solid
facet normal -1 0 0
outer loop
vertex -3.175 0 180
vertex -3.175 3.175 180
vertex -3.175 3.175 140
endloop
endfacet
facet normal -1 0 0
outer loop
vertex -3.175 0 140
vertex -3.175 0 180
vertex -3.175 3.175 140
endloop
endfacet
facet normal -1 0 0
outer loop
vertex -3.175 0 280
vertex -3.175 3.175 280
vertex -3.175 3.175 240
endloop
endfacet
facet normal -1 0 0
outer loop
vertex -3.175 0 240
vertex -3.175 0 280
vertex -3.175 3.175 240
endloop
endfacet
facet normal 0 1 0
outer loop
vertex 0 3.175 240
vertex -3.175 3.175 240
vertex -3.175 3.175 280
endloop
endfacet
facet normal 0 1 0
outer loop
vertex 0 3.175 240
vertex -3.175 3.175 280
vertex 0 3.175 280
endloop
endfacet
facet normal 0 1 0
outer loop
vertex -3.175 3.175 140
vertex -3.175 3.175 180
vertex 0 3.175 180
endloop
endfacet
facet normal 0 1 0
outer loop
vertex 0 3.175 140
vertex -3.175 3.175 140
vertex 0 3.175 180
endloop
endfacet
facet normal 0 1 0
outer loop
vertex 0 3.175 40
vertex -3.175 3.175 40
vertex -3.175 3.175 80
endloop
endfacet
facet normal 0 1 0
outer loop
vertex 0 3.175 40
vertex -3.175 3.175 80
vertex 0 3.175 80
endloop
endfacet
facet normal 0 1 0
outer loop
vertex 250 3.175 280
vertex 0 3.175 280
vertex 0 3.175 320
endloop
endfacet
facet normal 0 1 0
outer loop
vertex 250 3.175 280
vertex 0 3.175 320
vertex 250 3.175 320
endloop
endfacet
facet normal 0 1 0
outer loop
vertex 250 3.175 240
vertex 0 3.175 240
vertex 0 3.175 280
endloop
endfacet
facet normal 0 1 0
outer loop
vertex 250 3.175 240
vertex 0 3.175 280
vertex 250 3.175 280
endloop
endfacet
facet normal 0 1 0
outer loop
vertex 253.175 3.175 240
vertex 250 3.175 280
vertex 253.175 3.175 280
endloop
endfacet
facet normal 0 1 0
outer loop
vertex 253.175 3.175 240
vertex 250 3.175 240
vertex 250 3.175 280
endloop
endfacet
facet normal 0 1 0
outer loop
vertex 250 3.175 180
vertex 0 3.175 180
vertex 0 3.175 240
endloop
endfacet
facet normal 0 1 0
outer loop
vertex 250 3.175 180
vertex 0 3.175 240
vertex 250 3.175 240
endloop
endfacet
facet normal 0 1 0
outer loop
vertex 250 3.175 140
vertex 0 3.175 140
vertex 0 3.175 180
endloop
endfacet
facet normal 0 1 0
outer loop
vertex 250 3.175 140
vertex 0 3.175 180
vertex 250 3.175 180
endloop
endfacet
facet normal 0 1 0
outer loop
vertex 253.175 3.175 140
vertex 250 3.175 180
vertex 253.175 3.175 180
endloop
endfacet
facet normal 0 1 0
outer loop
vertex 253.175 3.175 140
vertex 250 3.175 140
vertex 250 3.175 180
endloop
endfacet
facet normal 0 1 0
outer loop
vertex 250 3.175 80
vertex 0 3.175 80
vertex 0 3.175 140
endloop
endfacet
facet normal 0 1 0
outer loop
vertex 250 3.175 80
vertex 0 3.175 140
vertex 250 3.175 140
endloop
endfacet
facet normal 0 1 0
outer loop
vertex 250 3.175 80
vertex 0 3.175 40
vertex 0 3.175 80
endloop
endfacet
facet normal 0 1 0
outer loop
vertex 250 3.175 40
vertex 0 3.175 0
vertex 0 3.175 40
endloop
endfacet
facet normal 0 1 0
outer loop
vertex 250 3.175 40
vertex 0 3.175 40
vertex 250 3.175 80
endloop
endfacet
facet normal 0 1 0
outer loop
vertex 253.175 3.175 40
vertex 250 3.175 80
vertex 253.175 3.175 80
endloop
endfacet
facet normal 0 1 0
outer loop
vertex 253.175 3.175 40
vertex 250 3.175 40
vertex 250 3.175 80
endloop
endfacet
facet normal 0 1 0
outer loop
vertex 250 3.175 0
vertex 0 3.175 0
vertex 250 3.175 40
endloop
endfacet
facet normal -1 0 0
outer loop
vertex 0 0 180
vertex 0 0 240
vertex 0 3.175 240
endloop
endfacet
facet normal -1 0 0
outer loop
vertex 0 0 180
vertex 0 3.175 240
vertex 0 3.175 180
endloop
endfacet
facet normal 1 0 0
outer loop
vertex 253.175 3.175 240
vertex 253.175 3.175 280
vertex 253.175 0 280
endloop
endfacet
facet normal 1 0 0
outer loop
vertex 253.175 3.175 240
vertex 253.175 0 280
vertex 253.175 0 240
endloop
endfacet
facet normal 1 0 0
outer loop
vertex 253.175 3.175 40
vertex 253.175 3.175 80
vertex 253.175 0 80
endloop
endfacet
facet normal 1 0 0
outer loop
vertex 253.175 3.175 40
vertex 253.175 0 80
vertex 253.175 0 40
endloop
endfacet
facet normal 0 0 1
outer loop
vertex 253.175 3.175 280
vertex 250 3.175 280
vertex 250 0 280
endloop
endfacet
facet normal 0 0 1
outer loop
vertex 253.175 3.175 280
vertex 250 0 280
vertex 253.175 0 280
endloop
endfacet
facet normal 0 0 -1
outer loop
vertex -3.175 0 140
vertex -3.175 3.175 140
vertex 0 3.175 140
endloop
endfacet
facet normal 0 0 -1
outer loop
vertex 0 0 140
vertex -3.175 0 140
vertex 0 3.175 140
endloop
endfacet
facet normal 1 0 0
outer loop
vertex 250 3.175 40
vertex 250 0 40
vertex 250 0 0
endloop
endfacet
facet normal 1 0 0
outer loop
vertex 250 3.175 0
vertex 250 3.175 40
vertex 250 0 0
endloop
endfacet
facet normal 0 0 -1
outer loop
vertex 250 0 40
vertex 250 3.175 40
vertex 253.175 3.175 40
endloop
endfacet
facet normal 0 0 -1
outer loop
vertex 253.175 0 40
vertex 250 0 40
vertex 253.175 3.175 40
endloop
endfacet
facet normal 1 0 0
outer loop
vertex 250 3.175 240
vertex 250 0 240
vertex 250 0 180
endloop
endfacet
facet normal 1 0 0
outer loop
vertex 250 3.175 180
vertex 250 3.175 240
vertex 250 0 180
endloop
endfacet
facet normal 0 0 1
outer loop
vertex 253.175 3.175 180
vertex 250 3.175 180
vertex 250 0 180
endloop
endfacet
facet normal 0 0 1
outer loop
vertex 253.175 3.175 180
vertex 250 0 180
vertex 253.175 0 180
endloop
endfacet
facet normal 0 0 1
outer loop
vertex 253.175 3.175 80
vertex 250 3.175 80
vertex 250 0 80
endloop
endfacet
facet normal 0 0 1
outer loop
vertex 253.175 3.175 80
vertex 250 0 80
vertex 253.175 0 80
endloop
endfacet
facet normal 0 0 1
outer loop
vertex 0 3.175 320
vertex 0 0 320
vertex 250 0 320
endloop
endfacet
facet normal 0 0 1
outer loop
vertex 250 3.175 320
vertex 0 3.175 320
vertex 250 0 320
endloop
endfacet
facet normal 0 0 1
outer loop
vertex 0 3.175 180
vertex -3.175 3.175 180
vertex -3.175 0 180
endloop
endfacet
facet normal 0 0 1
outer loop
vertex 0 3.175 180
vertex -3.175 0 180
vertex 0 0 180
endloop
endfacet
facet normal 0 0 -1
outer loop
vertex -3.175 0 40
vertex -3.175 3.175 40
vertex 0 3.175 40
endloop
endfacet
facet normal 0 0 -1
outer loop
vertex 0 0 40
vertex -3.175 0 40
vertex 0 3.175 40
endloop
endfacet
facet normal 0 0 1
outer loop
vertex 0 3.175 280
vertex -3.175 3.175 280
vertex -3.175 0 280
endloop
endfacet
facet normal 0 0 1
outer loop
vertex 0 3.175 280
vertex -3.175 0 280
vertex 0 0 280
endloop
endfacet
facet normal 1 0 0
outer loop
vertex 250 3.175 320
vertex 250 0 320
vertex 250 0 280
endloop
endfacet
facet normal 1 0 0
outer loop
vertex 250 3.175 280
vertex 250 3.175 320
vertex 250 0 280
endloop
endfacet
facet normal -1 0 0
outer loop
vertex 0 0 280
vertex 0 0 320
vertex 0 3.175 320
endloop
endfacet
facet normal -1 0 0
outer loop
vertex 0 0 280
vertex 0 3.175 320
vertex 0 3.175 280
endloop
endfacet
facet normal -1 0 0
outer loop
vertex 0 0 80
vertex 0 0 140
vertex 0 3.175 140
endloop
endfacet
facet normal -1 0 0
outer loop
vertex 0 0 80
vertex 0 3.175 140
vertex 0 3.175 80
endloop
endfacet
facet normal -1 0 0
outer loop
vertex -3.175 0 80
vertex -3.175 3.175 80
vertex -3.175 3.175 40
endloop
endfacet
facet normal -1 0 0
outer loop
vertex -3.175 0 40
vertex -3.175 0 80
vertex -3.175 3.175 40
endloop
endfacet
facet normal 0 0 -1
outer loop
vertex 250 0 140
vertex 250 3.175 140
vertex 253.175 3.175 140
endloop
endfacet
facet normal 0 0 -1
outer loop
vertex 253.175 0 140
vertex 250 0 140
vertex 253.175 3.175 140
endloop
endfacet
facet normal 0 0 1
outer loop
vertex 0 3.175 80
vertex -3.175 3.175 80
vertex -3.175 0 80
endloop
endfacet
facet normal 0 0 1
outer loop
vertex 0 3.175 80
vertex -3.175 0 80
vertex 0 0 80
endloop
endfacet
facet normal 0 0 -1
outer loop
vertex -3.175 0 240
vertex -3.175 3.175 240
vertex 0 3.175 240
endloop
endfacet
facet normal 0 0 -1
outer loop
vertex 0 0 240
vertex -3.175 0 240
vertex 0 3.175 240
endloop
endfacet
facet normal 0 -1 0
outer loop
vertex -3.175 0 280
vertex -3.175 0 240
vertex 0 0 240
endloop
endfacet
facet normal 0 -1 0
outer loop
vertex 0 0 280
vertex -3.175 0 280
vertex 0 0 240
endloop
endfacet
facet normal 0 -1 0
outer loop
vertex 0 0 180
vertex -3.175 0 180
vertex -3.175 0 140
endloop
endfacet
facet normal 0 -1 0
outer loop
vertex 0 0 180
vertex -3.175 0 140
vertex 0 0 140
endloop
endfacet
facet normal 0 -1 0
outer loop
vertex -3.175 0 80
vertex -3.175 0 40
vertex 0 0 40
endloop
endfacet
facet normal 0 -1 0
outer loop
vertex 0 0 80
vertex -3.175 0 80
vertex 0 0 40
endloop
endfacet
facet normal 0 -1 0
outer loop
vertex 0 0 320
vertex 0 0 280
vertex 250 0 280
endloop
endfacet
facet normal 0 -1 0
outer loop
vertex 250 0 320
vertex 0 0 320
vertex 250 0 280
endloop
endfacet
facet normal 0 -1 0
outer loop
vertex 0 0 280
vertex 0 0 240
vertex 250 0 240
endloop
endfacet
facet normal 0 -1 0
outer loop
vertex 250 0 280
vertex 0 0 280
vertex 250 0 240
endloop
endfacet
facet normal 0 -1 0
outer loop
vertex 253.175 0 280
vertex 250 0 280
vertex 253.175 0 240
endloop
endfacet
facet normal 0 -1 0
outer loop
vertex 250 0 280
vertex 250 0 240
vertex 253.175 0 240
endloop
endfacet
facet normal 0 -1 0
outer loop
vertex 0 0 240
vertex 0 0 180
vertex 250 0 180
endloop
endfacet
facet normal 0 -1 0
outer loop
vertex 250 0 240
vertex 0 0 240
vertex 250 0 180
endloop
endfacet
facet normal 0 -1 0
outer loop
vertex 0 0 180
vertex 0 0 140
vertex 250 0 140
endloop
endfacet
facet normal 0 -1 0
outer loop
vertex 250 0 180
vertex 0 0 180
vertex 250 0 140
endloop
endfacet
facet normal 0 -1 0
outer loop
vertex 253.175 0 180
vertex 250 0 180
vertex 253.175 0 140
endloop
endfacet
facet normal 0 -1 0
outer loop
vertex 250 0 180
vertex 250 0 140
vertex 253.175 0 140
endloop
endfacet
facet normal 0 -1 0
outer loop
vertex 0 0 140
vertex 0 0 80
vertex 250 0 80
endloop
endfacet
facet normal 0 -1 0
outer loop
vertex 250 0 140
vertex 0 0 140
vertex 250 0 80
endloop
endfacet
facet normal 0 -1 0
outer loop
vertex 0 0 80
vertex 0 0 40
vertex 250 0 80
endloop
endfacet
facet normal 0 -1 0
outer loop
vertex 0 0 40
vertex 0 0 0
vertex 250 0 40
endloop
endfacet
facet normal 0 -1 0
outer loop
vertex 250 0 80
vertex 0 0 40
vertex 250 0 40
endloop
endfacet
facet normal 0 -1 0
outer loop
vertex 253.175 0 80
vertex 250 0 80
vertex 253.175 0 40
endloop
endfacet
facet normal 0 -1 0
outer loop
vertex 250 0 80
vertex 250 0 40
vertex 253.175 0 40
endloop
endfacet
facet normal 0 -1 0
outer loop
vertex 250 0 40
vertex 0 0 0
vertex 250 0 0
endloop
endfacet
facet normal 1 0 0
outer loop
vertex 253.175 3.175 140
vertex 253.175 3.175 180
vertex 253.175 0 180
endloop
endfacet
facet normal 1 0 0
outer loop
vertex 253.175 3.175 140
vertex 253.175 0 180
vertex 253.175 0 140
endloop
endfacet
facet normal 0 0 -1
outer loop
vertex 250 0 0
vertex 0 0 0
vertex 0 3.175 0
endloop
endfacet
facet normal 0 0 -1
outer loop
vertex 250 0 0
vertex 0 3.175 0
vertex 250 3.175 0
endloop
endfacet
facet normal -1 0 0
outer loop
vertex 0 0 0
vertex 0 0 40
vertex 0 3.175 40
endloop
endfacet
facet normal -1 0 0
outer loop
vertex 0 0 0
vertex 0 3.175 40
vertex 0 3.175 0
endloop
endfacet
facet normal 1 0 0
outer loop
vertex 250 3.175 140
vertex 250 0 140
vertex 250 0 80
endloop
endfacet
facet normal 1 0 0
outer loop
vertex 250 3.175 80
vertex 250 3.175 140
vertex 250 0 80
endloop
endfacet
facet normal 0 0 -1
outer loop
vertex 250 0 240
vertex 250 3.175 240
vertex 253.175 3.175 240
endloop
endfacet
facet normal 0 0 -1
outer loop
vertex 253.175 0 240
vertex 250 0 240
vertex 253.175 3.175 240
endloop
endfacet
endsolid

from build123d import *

# Parameters (mm, degrees)
SKETCH1_W           = 250
SKETCH1_H           = 320
BOSS_EXTRUDE1_DEPTH = 3.175
SKETCH2_W           = 3.175
SKETCH2_H           = 40
BOSS_EXTRUDE2_DEPTH = 3.175


with BuildPart() as part:
    # Sketch1 → Boss-Extrude1 (new body)
    with BuildSketch(Plane(origin=(0, 0, 0), x_dir=(1, 0, 0), z_dir=(0, 1, 0))):
        with Locations((125, -160)):
            Rectangle(SKETCH1_W, SKETCH1_H)
    extrude(amount=BOSS_EXTRUDE1_DEPTH)

    # Sketch2 → Boss-Extrude2 (add)
    with BuildSketch(Plane(origin=(0, 3.175, 0), x_dir=(1, 0, 0), z_dir=(0, 1, 0))):
        with Locations((-1.5875, -60)):
            Rectangle(SKETCH2_W, SKETCH2_H)
        with Locations((251.5875, -60)):
            Rectangle(SKETCH2_W, SKETCH2_H)
        with Locations((251.5875, -160)):
            Rectangle(SKETCH2_W, SKETCH2_H)
        with Locations((-1.5875, -160)):
            Rectangle(SKETCH2_W, SKETCH2_H)
        with Locations((251.5875, -260)):
            Rectangle(SKETCH2_W, SKETCH2_H)
        with Locations((-1.5875, -260)):
            Rectangle(SKETCH2_W, SKETCH2_H)
    extrude(amount=-BOSS_EXTRUDE2_DEPTH)


solid = part.part
